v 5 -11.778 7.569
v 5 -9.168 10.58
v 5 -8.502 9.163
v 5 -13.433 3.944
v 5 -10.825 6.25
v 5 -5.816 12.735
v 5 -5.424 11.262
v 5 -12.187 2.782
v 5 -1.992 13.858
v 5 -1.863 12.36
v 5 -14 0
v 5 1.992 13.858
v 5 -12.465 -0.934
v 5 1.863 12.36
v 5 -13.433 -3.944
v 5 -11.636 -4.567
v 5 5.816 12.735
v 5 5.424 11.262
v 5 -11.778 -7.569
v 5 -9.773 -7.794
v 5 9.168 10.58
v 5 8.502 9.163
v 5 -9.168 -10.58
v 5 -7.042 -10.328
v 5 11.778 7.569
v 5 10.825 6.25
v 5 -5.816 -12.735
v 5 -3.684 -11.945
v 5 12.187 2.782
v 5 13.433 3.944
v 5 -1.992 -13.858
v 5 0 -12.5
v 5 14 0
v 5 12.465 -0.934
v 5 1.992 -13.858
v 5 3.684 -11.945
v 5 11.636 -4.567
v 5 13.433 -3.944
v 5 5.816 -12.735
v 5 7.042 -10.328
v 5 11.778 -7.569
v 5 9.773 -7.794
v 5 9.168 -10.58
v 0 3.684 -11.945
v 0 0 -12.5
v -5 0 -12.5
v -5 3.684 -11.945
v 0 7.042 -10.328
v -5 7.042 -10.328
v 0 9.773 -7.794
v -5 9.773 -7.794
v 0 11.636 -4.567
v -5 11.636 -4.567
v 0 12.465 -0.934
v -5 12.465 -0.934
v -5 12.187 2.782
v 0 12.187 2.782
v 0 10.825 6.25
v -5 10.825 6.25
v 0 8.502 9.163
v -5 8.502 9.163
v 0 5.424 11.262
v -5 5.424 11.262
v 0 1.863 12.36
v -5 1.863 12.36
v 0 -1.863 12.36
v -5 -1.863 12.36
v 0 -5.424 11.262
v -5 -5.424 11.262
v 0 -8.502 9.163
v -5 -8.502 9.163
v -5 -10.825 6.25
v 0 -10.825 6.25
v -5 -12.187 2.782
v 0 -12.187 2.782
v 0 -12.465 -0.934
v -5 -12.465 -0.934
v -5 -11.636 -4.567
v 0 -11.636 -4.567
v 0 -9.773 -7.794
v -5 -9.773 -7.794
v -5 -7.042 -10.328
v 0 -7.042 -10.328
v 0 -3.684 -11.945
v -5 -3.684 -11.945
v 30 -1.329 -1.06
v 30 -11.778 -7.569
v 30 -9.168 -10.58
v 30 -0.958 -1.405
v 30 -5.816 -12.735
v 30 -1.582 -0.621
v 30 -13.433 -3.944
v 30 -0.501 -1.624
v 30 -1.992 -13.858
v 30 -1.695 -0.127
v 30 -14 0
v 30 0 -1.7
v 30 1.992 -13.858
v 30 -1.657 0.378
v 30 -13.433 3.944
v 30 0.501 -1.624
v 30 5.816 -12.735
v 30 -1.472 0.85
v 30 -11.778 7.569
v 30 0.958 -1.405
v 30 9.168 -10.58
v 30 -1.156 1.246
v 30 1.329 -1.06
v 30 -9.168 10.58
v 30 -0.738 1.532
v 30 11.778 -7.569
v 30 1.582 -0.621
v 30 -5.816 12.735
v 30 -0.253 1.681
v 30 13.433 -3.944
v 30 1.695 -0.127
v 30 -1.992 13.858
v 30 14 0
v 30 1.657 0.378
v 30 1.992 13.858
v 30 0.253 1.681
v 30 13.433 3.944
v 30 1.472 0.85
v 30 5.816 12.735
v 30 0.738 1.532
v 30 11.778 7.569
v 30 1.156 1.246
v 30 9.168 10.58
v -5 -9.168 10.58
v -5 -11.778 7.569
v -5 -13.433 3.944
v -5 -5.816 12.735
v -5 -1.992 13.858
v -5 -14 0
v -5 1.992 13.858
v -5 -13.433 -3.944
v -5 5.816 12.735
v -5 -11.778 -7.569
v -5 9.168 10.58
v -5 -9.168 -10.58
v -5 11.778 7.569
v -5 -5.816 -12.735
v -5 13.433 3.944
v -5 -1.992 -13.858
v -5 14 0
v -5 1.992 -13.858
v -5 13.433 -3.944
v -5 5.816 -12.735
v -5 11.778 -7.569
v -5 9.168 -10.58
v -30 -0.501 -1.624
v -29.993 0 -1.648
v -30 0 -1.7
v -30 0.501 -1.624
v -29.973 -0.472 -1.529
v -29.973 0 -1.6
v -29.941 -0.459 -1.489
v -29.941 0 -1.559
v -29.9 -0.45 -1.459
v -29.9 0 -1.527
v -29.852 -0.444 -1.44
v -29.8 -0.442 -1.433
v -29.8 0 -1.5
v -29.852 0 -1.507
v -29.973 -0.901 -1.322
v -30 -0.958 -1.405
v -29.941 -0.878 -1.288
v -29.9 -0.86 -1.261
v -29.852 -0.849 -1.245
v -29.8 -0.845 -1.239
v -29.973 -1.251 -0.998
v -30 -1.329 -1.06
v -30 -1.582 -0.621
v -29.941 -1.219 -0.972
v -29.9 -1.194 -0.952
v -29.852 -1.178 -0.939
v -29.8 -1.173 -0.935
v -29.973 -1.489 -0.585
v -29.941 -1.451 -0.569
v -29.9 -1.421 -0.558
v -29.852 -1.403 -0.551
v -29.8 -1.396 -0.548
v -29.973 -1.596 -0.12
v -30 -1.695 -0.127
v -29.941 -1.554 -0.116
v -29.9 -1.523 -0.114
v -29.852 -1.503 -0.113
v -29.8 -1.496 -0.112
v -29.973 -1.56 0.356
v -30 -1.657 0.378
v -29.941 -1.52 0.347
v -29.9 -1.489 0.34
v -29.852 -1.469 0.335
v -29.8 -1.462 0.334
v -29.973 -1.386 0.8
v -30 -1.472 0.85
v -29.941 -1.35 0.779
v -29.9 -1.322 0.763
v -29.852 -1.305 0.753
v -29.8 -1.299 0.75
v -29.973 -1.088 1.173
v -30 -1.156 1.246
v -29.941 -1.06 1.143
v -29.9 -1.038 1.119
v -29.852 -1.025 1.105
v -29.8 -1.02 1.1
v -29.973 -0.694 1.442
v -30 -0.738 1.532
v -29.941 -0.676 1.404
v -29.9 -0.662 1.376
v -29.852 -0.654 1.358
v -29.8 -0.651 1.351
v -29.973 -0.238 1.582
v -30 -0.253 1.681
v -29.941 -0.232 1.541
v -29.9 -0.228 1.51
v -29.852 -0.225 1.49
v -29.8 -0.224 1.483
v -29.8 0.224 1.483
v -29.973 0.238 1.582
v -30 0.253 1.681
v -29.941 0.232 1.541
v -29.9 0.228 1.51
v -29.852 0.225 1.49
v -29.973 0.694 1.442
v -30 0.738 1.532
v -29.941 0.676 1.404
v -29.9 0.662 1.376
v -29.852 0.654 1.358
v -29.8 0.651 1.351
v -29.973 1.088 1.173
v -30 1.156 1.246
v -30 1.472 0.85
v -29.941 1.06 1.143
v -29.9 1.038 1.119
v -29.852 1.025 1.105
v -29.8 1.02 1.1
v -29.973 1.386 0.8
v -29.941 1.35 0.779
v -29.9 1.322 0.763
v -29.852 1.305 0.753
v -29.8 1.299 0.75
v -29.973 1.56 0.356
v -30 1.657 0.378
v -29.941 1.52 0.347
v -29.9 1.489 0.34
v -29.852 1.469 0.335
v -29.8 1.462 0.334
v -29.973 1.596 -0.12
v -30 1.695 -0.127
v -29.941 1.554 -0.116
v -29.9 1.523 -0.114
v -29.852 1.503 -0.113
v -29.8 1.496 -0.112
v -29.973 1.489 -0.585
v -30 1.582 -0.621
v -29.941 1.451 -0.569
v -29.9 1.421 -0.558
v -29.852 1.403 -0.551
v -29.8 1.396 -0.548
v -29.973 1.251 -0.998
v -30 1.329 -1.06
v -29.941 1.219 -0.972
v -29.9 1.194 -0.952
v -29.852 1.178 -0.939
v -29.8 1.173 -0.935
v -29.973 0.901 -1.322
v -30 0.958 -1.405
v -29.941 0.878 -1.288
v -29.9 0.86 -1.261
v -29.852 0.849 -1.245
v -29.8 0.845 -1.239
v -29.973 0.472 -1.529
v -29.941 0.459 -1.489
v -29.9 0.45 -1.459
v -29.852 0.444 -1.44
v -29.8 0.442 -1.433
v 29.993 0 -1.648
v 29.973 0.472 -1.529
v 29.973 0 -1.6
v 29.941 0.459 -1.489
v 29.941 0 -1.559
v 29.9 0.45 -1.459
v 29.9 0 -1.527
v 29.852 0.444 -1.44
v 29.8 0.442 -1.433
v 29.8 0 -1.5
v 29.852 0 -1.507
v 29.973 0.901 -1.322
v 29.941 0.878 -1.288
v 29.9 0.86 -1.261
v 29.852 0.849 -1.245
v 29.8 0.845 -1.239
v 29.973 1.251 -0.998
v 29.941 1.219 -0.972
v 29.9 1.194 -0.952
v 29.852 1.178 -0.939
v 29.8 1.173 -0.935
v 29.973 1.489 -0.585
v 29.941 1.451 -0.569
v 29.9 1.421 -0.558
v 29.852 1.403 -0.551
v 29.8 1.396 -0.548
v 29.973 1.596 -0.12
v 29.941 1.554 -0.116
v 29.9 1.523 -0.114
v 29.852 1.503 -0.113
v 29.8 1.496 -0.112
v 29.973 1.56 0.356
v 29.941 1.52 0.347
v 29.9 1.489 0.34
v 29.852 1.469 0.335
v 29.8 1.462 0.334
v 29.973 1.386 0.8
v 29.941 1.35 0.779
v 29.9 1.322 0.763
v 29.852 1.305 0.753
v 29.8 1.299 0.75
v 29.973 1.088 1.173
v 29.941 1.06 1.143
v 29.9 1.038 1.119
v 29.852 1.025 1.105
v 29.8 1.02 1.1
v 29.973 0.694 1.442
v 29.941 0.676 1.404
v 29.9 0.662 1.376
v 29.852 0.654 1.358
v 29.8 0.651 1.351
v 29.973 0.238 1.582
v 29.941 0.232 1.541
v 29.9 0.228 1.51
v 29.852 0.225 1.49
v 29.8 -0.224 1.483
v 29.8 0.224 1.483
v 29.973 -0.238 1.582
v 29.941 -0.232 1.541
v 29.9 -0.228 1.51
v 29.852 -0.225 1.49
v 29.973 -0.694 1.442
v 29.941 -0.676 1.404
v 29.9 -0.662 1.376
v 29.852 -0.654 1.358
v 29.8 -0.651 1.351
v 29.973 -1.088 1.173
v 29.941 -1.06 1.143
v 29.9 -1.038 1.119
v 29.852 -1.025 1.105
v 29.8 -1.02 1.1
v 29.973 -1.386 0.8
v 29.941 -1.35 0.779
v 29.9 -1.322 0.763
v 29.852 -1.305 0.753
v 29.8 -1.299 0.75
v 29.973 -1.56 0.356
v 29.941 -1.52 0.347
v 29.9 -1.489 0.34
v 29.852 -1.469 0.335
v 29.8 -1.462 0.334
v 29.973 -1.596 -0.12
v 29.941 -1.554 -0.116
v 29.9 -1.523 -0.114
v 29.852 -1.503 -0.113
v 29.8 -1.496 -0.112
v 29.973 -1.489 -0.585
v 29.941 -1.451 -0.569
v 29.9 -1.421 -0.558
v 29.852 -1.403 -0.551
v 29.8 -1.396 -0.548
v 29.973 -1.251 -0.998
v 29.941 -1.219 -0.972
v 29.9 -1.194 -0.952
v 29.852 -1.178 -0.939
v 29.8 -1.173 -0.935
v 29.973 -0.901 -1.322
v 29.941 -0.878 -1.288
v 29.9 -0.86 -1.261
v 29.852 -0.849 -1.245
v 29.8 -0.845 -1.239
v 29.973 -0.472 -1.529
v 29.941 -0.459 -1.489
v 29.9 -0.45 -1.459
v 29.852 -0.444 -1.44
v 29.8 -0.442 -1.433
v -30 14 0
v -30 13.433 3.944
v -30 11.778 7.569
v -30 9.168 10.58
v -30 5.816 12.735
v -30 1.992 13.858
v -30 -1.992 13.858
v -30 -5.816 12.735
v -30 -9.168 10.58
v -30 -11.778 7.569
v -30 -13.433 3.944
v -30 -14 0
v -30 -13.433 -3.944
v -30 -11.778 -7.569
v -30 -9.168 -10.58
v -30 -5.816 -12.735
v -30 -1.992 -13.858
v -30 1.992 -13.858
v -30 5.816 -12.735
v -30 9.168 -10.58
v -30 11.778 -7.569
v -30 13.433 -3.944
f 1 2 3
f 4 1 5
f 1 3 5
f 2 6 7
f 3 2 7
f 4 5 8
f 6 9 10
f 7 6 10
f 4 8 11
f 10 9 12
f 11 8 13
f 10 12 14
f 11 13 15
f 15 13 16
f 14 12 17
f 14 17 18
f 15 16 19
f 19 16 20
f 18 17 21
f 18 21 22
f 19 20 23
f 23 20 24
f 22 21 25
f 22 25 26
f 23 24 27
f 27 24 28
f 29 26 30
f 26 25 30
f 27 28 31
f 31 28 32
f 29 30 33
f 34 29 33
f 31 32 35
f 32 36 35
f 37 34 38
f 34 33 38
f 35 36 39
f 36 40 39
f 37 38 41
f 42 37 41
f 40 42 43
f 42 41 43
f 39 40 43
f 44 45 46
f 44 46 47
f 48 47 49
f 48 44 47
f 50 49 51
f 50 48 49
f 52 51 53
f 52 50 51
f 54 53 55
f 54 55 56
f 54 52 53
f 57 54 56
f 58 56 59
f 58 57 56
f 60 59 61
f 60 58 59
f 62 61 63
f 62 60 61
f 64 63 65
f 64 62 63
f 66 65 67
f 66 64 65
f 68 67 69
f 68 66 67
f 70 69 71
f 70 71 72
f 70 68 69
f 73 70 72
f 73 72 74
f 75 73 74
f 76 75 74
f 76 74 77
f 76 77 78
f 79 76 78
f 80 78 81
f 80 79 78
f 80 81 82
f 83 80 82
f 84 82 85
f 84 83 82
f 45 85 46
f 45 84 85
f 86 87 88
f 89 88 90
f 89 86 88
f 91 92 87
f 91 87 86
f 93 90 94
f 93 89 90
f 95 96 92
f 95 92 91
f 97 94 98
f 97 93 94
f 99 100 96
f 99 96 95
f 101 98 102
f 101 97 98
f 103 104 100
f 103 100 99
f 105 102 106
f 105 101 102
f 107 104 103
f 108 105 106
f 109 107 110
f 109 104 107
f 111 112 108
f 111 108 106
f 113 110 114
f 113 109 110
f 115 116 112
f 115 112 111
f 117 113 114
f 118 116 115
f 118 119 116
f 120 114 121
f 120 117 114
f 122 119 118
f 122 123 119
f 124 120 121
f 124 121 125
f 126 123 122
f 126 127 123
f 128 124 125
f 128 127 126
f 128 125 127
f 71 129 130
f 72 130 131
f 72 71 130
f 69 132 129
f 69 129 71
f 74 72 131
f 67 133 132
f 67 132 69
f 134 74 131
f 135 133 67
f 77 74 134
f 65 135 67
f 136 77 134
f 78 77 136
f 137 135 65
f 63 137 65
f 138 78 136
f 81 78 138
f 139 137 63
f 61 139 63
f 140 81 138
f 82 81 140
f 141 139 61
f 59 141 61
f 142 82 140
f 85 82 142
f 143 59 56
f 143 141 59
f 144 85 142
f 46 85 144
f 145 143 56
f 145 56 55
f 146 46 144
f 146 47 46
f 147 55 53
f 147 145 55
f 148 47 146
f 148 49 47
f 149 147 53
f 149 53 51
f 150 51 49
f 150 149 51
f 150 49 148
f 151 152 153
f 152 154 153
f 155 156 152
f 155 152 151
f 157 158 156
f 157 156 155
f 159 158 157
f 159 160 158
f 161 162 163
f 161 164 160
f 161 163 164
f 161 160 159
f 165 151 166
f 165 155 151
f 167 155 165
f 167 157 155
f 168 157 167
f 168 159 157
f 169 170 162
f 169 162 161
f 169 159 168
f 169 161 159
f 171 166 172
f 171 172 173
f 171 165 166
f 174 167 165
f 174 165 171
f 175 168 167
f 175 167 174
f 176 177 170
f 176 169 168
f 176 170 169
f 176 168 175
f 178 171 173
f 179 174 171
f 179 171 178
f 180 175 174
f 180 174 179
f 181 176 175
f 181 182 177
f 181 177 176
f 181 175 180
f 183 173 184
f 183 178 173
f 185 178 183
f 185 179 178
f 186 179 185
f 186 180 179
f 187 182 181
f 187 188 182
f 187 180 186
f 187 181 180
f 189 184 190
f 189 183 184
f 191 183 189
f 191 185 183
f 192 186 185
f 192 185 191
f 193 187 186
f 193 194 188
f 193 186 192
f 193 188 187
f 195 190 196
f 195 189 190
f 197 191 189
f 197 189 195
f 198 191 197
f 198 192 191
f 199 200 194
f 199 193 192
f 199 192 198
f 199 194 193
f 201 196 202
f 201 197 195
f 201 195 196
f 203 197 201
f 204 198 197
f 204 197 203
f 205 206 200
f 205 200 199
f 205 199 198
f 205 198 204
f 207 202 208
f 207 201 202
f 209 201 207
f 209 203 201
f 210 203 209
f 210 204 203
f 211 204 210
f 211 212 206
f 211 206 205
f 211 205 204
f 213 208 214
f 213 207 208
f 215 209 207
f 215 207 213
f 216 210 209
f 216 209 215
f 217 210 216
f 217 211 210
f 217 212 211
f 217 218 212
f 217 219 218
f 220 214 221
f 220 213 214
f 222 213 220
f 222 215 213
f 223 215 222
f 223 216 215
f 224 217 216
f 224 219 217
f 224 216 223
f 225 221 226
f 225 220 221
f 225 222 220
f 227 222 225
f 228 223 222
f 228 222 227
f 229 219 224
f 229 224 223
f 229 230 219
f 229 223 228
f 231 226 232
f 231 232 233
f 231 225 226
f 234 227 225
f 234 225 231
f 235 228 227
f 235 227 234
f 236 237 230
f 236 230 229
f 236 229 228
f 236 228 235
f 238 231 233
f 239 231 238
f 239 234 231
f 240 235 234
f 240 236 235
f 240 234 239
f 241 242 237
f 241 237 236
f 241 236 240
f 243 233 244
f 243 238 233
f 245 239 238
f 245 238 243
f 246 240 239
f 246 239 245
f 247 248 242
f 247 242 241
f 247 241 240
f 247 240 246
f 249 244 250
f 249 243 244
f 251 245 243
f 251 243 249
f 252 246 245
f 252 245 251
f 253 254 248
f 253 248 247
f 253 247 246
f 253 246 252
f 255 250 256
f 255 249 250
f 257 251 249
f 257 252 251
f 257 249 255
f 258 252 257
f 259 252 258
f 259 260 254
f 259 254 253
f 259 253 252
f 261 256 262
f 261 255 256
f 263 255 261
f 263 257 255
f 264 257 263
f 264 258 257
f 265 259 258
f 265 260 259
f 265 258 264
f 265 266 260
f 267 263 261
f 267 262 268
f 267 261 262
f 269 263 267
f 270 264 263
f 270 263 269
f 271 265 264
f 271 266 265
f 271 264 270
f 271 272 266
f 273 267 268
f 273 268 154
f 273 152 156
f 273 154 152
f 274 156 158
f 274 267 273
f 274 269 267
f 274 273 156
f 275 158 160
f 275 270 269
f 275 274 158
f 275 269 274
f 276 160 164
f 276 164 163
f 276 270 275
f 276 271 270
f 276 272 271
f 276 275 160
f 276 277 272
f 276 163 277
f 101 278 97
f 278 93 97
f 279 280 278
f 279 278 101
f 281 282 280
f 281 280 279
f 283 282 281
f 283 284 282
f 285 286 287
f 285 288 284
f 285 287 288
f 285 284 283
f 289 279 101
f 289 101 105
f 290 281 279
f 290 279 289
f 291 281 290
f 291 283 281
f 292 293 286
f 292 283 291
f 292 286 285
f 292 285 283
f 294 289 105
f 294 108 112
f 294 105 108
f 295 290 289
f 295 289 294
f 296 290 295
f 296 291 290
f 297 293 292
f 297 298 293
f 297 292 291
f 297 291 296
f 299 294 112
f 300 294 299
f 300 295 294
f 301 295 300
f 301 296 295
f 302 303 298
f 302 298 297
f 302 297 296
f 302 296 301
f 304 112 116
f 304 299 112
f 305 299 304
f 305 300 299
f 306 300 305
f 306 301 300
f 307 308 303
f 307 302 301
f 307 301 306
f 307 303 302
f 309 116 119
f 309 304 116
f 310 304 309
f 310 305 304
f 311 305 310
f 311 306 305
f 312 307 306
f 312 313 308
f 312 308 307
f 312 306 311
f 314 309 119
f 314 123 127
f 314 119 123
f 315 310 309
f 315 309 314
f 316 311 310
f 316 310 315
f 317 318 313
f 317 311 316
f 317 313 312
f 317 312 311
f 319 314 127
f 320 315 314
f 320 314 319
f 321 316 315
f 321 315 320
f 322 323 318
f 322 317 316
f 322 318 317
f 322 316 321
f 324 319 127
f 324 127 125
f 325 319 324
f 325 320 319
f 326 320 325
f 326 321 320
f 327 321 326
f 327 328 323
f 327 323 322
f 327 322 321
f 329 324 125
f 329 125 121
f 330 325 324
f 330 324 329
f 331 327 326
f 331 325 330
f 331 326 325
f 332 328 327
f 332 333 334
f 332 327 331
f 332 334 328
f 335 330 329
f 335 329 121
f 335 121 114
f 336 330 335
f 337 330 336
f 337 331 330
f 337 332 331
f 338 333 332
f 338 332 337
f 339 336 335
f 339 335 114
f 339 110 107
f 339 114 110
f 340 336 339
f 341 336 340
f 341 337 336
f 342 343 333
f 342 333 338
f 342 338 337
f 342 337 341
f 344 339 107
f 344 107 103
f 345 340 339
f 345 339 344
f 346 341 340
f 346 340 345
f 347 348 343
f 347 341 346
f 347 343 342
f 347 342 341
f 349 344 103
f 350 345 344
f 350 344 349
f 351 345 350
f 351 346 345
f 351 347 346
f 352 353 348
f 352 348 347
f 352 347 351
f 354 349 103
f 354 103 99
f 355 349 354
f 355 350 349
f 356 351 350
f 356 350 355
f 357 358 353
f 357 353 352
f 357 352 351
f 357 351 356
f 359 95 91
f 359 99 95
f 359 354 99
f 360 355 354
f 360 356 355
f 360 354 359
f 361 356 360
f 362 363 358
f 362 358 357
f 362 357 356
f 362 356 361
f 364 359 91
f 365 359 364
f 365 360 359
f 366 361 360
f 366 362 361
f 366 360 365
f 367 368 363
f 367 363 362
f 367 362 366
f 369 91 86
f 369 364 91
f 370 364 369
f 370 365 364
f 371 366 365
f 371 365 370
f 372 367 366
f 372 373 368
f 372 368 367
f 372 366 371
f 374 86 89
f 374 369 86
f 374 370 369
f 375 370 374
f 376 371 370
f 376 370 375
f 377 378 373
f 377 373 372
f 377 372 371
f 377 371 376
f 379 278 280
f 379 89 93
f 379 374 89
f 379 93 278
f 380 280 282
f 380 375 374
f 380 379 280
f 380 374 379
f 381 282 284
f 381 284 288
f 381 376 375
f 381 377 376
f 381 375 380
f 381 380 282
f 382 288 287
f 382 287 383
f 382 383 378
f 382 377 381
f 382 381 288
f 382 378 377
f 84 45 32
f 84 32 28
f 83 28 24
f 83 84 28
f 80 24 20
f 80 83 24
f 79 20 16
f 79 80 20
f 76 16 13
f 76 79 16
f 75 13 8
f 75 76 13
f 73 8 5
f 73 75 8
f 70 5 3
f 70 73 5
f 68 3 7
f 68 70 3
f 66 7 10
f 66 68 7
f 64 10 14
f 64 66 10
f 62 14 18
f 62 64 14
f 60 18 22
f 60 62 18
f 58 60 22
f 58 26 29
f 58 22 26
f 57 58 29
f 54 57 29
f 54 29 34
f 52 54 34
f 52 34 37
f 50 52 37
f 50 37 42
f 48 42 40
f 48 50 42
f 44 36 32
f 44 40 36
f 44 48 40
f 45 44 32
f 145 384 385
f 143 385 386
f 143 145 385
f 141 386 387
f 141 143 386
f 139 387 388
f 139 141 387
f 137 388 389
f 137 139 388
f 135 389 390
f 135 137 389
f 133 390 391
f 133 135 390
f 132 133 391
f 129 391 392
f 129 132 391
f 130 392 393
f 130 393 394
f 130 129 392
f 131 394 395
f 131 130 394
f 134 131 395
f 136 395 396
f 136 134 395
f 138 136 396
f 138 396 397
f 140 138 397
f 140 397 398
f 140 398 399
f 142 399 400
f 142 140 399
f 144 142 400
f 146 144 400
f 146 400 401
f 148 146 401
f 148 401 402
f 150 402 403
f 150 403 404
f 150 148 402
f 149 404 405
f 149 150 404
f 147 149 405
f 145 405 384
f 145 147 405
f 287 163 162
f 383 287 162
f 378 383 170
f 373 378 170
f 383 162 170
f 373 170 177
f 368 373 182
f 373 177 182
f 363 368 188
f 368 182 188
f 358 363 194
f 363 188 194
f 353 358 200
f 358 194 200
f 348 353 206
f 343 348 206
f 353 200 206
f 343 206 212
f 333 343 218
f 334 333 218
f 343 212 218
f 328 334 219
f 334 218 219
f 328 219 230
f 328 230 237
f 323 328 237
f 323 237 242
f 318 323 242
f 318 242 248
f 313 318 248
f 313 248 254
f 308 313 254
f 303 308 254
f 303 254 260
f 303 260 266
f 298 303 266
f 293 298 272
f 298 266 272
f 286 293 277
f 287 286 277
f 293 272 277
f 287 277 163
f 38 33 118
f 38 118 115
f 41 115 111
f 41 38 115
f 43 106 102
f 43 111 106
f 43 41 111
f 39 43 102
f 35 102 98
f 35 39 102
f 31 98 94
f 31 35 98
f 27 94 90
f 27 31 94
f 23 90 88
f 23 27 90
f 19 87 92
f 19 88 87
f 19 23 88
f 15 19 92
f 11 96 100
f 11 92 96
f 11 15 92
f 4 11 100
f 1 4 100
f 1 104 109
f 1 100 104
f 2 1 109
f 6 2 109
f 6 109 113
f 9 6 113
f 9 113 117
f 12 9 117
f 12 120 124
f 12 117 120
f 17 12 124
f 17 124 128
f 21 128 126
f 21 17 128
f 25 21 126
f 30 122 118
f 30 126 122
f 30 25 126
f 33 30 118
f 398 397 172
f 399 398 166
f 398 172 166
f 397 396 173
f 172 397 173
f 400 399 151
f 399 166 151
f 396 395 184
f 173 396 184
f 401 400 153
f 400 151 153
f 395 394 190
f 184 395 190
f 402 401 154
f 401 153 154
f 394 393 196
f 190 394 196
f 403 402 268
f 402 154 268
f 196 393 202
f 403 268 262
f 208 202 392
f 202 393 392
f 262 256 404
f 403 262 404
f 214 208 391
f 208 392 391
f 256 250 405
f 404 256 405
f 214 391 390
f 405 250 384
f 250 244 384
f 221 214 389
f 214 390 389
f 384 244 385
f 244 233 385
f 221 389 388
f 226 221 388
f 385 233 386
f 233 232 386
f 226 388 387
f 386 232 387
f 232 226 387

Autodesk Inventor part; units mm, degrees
ref_plane "YZ Plane" through (0, 0, 0) normal (1, 0, 0) x (0, 1, 0)
ref_plane "XZ Plane" through (0, 0, 0) normal (0, 1, 0) x (-1, 0, 0)
sketch "Эскиз1" plane through (0, 0, 0) normal (1, 0, 0) x (0, 1, 0)
  circle A0 centre (0, 0) radius 14
  dimension "d0" = 28
extrude "Выдавливание1" add sketch "Эскиз1" along normal mid plane 60
sketch "Эскиз2" plane through (30, 0, 0) normal (1, 0, 0) x (0, 0, -1)
  point P0 (0, 0)
  point P1 (0, 0)
hole "Отверстие1" at (30, 0, 0) direction (-1, 0, 0) diameter 3 depth 60
fillet "Сопряжение1" radius 0.2 2 edges at (30, 0, 1.5) (-30, 0, 1.5)
ref_plane "РабПлоскость1" through (0, 0, 0) normal (1, 0, 0) x (0, 0, -1)
sketch "Эскиз3" plane through (0, 0, 0) normal (1, 0, 0) x (0, 0, -1)
  circle A0 centre (0, 0) radius 12.5
  circle A1 centre (0, 0) radius 14
  dimension "d11" = 25
extrude "Выдавливание2" cut sketch "Эскиз3" along normal mid plane 10
properties part number "Вал конвейера"
